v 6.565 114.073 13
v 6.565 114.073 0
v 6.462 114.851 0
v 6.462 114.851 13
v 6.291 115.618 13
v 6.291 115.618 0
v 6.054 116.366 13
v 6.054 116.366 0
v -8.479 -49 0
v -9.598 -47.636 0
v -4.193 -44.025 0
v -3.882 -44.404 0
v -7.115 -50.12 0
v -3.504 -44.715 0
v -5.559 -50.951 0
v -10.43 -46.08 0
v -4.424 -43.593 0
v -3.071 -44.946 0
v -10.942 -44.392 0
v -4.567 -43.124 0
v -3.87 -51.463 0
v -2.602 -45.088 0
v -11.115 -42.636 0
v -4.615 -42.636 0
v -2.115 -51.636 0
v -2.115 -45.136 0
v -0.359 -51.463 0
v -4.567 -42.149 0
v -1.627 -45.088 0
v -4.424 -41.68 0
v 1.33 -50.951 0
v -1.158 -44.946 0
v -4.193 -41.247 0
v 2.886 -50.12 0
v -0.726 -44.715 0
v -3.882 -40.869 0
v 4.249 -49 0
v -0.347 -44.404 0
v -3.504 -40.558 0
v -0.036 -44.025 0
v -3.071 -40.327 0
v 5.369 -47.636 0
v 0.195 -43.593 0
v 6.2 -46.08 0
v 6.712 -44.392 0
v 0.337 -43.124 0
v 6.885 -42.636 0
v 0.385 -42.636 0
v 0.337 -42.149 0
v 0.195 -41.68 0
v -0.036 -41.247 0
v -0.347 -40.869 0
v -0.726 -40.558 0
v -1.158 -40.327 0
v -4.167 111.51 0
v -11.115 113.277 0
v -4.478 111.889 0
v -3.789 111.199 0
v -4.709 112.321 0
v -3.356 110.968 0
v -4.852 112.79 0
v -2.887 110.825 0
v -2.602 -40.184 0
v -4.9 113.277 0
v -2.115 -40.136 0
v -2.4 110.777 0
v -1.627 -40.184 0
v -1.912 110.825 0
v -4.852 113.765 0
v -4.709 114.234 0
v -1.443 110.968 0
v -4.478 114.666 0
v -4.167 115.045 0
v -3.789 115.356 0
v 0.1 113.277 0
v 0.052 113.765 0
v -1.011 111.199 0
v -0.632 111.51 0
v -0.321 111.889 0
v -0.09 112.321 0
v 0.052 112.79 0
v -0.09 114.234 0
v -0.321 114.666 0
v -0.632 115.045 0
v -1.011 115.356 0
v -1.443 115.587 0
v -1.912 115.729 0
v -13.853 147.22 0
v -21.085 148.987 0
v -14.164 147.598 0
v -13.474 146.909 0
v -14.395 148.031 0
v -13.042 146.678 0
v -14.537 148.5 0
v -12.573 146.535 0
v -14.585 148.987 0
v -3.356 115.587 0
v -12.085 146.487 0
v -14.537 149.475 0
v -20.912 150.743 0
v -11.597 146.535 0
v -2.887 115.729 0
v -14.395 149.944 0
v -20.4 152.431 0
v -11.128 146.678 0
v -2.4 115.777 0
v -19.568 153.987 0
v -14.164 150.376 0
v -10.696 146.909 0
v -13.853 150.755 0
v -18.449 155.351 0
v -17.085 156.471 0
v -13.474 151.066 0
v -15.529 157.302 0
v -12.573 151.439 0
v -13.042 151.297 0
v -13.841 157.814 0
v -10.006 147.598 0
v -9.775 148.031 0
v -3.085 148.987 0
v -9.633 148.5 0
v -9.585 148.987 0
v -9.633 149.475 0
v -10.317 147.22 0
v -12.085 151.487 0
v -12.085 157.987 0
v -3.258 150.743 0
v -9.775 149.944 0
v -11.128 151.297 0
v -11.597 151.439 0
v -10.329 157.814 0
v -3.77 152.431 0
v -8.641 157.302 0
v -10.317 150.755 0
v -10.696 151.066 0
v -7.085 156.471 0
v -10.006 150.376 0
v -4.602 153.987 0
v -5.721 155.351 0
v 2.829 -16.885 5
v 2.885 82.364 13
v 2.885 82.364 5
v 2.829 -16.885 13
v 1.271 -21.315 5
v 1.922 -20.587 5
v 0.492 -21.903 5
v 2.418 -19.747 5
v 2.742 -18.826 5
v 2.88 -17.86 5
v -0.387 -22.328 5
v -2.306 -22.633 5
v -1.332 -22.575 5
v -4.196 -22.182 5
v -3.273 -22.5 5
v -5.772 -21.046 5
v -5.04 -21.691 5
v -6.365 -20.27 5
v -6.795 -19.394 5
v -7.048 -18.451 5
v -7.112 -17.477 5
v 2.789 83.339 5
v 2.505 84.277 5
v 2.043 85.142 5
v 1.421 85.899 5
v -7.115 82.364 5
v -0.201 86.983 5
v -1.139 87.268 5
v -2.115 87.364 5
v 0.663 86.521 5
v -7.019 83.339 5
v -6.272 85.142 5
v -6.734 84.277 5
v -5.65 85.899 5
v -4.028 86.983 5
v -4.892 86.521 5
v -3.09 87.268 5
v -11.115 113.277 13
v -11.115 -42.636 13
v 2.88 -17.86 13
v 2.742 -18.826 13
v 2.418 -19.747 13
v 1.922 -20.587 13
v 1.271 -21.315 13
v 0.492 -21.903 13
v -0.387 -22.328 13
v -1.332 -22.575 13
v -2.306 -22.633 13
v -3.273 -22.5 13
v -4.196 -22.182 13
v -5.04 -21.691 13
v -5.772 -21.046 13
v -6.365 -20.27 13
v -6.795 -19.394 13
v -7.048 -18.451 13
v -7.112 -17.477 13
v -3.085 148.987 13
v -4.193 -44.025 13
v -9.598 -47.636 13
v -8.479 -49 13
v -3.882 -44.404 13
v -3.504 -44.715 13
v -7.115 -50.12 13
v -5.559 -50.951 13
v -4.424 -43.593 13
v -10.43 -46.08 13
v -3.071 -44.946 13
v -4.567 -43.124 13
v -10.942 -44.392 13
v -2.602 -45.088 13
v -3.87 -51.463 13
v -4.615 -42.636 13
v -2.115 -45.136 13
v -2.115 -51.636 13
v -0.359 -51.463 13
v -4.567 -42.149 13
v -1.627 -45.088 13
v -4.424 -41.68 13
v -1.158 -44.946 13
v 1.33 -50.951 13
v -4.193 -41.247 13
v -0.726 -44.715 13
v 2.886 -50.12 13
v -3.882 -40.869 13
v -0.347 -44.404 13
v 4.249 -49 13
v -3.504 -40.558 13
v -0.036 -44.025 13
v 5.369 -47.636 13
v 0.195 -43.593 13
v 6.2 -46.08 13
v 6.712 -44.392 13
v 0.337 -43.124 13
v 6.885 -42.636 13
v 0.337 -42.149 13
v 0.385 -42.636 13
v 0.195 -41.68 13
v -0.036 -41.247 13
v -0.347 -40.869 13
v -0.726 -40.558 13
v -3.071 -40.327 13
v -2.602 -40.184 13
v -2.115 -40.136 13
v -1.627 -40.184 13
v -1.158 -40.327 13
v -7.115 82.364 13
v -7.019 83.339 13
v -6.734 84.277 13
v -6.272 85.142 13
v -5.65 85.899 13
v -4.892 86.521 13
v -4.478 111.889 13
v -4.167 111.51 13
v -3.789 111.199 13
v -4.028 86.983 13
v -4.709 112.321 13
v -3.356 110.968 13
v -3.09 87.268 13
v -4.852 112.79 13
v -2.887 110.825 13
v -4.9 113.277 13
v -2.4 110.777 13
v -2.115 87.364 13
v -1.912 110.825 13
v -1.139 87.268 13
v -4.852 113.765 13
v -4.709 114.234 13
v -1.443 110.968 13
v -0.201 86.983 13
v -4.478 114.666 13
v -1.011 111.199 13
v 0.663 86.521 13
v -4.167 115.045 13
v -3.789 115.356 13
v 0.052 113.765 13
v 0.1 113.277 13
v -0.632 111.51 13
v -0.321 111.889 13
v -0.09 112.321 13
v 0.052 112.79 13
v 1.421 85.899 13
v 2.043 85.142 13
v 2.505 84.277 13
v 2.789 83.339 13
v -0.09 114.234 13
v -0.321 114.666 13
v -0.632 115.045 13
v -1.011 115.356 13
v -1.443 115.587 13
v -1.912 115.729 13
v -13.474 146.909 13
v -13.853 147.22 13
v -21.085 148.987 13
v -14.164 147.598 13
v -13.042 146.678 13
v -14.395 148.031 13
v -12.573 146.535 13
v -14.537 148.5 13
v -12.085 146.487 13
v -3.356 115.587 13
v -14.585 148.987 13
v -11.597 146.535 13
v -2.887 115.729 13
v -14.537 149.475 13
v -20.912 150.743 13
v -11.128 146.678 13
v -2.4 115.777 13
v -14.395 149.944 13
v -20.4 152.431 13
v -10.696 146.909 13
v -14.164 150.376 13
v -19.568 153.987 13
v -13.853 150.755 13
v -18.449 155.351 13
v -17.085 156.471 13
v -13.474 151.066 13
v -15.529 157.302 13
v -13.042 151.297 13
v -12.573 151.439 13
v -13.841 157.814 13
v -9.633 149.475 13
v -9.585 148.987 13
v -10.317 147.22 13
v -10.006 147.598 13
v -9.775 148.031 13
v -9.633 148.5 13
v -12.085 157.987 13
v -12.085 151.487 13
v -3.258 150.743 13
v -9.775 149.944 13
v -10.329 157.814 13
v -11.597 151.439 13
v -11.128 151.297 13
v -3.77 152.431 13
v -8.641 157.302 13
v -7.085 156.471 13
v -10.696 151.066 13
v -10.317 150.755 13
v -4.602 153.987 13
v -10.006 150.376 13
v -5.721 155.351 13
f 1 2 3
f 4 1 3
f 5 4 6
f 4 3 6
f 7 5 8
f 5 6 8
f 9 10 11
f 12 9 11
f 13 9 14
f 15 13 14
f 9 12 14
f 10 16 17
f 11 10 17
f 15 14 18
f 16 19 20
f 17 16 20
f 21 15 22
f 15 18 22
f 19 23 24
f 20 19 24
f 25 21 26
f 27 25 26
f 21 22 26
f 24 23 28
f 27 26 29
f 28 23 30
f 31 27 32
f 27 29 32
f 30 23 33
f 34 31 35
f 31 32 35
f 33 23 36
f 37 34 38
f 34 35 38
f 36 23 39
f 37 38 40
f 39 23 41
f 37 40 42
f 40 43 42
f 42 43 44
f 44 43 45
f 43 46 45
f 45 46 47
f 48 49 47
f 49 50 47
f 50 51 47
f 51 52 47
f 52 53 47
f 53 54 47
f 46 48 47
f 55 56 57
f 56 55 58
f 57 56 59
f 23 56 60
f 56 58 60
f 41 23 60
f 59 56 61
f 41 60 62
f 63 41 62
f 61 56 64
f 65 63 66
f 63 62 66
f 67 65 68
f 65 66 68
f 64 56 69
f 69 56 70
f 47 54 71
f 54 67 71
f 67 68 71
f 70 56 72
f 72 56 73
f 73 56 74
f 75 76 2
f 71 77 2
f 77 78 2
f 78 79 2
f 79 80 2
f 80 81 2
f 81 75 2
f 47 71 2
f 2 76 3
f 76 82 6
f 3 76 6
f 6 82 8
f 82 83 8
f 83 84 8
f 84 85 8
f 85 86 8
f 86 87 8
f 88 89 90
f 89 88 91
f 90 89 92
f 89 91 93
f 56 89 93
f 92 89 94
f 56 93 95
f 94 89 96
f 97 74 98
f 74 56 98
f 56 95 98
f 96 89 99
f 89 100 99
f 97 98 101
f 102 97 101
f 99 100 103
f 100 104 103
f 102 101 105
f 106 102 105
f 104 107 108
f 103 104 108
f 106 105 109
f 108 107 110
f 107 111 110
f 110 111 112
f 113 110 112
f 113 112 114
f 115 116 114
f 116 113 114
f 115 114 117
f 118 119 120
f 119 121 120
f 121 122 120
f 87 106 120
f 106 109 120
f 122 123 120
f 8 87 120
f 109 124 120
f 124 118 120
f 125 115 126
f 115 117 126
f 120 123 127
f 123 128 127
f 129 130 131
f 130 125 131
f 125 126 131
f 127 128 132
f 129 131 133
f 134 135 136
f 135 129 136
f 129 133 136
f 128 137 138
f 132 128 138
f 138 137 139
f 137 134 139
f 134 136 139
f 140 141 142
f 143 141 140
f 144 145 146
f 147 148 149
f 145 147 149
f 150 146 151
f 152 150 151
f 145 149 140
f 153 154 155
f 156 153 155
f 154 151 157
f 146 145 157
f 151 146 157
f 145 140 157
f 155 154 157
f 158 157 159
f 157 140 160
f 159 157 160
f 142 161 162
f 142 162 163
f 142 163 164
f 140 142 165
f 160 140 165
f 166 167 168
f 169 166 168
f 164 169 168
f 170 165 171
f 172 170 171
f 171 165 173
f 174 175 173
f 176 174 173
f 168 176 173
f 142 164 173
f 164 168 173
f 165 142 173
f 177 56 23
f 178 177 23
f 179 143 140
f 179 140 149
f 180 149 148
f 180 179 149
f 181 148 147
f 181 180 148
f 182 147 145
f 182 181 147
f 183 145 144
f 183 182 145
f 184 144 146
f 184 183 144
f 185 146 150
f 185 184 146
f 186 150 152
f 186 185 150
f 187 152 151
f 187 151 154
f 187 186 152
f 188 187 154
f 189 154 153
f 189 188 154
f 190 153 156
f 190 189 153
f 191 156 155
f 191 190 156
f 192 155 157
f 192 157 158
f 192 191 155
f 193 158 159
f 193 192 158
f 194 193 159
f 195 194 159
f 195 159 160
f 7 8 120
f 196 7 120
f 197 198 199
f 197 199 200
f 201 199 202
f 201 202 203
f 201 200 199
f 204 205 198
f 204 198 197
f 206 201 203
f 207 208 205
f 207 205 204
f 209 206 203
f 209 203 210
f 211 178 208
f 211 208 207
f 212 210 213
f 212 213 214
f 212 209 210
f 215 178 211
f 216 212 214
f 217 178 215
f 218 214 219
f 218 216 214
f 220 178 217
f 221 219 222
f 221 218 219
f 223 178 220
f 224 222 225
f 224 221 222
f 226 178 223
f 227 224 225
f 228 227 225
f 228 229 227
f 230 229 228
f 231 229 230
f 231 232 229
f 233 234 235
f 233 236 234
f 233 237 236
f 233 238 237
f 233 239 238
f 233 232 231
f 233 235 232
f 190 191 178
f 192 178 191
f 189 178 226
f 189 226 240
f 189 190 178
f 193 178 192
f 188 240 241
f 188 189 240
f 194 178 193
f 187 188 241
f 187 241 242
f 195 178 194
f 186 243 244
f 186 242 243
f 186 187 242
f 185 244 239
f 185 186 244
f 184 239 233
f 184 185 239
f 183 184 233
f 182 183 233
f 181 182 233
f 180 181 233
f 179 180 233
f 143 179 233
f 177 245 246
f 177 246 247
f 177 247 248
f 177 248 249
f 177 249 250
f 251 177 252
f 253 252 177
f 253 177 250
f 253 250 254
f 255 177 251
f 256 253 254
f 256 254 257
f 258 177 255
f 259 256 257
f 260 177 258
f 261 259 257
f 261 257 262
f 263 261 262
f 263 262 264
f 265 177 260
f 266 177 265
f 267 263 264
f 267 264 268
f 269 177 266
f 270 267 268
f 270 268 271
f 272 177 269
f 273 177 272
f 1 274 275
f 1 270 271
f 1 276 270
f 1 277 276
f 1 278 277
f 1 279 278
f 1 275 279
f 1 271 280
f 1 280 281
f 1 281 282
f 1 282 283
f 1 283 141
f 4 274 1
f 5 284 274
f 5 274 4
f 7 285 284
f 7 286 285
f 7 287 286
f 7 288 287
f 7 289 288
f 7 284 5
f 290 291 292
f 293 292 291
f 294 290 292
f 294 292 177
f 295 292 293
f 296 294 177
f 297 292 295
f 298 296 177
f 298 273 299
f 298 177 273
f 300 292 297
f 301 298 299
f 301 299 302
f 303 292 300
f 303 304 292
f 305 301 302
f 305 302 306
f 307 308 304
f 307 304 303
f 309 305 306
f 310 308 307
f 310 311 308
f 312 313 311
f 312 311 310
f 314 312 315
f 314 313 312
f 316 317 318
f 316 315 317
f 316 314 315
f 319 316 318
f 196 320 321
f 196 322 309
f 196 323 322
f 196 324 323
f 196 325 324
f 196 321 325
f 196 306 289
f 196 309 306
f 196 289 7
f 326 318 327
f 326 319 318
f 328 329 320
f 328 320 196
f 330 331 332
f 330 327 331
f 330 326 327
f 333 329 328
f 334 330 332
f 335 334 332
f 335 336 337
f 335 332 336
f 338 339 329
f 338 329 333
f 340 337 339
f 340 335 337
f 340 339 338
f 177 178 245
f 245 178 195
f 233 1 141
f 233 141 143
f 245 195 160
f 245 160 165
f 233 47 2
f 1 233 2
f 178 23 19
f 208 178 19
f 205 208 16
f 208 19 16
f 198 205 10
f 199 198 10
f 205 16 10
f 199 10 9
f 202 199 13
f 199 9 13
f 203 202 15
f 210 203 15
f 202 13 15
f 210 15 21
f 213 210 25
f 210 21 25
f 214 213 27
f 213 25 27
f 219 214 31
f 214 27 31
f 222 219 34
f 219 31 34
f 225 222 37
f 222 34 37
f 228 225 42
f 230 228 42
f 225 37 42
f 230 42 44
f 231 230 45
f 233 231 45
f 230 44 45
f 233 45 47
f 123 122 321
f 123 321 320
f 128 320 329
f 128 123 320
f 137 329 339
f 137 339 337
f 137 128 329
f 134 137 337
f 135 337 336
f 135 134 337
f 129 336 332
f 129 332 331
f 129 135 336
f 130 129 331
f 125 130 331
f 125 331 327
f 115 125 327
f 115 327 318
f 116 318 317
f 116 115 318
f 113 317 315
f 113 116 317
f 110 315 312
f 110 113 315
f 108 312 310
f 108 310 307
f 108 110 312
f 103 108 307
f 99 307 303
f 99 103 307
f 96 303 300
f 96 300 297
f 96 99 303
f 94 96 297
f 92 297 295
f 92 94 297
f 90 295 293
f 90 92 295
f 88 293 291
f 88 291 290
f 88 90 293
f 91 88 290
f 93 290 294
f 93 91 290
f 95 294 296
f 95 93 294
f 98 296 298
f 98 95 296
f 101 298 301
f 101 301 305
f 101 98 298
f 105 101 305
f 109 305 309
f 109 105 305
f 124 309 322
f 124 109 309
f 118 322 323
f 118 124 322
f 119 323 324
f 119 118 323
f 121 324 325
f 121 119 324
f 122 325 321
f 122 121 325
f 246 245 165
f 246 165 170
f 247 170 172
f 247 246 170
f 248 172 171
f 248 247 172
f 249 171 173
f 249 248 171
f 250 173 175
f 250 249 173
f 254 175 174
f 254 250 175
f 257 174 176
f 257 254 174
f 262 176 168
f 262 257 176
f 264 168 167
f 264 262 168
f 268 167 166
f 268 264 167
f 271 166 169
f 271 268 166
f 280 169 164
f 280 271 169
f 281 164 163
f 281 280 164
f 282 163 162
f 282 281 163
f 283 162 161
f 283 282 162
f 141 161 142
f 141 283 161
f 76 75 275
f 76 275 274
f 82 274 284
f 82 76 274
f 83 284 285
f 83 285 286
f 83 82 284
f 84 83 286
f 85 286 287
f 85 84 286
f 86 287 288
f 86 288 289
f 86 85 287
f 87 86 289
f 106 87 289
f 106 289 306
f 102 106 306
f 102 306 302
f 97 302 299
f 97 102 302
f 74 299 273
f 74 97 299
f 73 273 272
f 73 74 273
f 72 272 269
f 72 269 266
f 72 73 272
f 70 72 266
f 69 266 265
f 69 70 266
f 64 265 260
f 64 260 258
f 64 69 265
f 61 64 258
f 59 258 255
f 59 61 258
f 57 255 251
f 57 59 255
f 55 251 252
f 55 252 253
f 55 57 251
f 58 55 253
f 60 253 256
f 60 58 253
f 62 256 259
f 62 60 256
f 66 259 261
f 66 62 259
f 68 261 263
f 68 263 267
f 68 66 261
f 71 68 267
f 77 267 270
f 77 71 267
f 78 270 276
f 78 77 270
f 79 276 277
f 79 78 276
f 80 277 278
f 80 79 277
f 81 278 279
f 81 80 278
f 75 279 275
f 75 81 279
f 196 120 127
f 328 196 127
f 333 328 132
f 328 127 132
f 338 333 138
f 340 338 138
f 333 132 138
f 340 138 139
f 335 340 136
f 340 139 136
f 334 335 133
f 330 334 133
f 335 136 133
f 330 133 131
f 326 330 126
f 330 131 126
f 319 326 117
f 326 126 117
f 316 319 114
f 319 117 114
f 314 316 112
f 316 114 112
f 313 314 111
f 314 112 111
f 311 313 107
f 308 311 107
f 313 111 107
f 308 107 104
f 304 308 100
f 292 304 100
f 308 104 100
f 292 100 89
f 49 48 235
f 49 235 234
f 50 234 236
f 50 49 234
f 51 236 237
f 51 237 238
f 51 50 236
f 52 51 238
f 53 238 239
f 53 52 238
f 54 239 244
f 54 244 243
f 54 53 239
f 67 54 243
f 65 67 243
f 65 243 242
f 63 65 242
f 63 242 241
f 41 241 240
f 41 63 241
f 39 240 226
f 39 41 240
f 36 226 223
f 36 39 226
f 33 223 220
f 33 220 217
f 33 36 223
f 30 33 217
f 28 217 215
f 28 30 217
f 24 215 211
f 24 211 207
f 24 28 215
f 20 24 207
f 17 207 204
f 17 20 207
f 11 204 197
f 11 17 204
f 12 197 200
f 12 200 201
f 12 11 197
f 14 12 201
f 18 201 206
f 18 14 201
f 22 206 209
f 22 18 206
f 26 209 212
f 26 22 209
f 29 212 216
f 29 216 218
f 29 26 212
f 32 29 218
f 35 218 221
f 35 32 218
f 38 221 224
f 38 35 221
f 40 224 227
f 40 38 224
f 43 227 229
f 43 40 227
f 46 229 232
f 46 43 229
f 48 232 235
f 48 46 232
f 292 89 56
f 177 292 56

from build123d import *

# Parameters (mm, degrees)
SKETCH1_R      = 2.5
EXTRUDE1_DEPTH = 13
EXTRUDE2_DEPTH = 8


with BuildPart() as part:
    # Sketch1 → Extrude1 (new body)
    with BuildSketch(Plane.XY):
        with BuildLine():
            Line((-11.114615619, 113.277430864), (-11.114615619, -42.636308558))
            ThreePointArc((-11.114615619, -42.636308558), (-2.114615619, -51.636308558), (6.885384381, -42.636308558))
            Line((6.885384381, -42.636308558), (6.565118116, 114.072785693))
            ThreePointArc((6.565118116, 114.072785693), (6.384581051, 115.236243879), (6.053710916, 116.36617907))
            Line((6.053710916, 116.36617907), (-3.084934036, 148.987312466))
            ThreePointArc((-3.084934036, 148.987312466), (-12.084934036, 157.987312466), (-21.084934036, 148.987312466))
            Line((-21.084934036, 148.987312466), (-11.114615619, 113.277430864))
        make_face()
        with Locations((-2.399669149, 113.277430864)):
            Circle(SKETCH1_R, mode=Mode.SUBTRACT)
        with Locations((-2.114615619, -42.636308558)):
            Circle(SKETCH1_R, mode=Mode.SUBTRACT)
        with Locations((-12.084934036, 148.987312466)):
            Circle(SKETCH1_R, mode=Mode.SUBTRACT)
    extrude(amount=EXTRUDE1_DEPTH)

    # Sketch2 → Extrude2 (cut)
    with BuildSketch(Plane.XY.offset(13)):
        with BuildLine():
            Line((2.885384381, 82.363691442), (2.828618024, -16.885015572))
            ThreePointArc((2.828618024, -16.885015572), (-1.817326792, -22.627462668), (-7.112080712, -17.477114833))
            Line((-7.112080712, -17.477114833), (-7.114615619, 82.363691442))
            ThreePointArc((-7.114615619, 82.363691442), (-2.114615619, 87.363691442), (2.885384381, 82.363691442))
        make_face()
    extrude(amount=-EXTRUDE2_DEPTH, mode=Mode.SUBTRACT)


solid = part.part
